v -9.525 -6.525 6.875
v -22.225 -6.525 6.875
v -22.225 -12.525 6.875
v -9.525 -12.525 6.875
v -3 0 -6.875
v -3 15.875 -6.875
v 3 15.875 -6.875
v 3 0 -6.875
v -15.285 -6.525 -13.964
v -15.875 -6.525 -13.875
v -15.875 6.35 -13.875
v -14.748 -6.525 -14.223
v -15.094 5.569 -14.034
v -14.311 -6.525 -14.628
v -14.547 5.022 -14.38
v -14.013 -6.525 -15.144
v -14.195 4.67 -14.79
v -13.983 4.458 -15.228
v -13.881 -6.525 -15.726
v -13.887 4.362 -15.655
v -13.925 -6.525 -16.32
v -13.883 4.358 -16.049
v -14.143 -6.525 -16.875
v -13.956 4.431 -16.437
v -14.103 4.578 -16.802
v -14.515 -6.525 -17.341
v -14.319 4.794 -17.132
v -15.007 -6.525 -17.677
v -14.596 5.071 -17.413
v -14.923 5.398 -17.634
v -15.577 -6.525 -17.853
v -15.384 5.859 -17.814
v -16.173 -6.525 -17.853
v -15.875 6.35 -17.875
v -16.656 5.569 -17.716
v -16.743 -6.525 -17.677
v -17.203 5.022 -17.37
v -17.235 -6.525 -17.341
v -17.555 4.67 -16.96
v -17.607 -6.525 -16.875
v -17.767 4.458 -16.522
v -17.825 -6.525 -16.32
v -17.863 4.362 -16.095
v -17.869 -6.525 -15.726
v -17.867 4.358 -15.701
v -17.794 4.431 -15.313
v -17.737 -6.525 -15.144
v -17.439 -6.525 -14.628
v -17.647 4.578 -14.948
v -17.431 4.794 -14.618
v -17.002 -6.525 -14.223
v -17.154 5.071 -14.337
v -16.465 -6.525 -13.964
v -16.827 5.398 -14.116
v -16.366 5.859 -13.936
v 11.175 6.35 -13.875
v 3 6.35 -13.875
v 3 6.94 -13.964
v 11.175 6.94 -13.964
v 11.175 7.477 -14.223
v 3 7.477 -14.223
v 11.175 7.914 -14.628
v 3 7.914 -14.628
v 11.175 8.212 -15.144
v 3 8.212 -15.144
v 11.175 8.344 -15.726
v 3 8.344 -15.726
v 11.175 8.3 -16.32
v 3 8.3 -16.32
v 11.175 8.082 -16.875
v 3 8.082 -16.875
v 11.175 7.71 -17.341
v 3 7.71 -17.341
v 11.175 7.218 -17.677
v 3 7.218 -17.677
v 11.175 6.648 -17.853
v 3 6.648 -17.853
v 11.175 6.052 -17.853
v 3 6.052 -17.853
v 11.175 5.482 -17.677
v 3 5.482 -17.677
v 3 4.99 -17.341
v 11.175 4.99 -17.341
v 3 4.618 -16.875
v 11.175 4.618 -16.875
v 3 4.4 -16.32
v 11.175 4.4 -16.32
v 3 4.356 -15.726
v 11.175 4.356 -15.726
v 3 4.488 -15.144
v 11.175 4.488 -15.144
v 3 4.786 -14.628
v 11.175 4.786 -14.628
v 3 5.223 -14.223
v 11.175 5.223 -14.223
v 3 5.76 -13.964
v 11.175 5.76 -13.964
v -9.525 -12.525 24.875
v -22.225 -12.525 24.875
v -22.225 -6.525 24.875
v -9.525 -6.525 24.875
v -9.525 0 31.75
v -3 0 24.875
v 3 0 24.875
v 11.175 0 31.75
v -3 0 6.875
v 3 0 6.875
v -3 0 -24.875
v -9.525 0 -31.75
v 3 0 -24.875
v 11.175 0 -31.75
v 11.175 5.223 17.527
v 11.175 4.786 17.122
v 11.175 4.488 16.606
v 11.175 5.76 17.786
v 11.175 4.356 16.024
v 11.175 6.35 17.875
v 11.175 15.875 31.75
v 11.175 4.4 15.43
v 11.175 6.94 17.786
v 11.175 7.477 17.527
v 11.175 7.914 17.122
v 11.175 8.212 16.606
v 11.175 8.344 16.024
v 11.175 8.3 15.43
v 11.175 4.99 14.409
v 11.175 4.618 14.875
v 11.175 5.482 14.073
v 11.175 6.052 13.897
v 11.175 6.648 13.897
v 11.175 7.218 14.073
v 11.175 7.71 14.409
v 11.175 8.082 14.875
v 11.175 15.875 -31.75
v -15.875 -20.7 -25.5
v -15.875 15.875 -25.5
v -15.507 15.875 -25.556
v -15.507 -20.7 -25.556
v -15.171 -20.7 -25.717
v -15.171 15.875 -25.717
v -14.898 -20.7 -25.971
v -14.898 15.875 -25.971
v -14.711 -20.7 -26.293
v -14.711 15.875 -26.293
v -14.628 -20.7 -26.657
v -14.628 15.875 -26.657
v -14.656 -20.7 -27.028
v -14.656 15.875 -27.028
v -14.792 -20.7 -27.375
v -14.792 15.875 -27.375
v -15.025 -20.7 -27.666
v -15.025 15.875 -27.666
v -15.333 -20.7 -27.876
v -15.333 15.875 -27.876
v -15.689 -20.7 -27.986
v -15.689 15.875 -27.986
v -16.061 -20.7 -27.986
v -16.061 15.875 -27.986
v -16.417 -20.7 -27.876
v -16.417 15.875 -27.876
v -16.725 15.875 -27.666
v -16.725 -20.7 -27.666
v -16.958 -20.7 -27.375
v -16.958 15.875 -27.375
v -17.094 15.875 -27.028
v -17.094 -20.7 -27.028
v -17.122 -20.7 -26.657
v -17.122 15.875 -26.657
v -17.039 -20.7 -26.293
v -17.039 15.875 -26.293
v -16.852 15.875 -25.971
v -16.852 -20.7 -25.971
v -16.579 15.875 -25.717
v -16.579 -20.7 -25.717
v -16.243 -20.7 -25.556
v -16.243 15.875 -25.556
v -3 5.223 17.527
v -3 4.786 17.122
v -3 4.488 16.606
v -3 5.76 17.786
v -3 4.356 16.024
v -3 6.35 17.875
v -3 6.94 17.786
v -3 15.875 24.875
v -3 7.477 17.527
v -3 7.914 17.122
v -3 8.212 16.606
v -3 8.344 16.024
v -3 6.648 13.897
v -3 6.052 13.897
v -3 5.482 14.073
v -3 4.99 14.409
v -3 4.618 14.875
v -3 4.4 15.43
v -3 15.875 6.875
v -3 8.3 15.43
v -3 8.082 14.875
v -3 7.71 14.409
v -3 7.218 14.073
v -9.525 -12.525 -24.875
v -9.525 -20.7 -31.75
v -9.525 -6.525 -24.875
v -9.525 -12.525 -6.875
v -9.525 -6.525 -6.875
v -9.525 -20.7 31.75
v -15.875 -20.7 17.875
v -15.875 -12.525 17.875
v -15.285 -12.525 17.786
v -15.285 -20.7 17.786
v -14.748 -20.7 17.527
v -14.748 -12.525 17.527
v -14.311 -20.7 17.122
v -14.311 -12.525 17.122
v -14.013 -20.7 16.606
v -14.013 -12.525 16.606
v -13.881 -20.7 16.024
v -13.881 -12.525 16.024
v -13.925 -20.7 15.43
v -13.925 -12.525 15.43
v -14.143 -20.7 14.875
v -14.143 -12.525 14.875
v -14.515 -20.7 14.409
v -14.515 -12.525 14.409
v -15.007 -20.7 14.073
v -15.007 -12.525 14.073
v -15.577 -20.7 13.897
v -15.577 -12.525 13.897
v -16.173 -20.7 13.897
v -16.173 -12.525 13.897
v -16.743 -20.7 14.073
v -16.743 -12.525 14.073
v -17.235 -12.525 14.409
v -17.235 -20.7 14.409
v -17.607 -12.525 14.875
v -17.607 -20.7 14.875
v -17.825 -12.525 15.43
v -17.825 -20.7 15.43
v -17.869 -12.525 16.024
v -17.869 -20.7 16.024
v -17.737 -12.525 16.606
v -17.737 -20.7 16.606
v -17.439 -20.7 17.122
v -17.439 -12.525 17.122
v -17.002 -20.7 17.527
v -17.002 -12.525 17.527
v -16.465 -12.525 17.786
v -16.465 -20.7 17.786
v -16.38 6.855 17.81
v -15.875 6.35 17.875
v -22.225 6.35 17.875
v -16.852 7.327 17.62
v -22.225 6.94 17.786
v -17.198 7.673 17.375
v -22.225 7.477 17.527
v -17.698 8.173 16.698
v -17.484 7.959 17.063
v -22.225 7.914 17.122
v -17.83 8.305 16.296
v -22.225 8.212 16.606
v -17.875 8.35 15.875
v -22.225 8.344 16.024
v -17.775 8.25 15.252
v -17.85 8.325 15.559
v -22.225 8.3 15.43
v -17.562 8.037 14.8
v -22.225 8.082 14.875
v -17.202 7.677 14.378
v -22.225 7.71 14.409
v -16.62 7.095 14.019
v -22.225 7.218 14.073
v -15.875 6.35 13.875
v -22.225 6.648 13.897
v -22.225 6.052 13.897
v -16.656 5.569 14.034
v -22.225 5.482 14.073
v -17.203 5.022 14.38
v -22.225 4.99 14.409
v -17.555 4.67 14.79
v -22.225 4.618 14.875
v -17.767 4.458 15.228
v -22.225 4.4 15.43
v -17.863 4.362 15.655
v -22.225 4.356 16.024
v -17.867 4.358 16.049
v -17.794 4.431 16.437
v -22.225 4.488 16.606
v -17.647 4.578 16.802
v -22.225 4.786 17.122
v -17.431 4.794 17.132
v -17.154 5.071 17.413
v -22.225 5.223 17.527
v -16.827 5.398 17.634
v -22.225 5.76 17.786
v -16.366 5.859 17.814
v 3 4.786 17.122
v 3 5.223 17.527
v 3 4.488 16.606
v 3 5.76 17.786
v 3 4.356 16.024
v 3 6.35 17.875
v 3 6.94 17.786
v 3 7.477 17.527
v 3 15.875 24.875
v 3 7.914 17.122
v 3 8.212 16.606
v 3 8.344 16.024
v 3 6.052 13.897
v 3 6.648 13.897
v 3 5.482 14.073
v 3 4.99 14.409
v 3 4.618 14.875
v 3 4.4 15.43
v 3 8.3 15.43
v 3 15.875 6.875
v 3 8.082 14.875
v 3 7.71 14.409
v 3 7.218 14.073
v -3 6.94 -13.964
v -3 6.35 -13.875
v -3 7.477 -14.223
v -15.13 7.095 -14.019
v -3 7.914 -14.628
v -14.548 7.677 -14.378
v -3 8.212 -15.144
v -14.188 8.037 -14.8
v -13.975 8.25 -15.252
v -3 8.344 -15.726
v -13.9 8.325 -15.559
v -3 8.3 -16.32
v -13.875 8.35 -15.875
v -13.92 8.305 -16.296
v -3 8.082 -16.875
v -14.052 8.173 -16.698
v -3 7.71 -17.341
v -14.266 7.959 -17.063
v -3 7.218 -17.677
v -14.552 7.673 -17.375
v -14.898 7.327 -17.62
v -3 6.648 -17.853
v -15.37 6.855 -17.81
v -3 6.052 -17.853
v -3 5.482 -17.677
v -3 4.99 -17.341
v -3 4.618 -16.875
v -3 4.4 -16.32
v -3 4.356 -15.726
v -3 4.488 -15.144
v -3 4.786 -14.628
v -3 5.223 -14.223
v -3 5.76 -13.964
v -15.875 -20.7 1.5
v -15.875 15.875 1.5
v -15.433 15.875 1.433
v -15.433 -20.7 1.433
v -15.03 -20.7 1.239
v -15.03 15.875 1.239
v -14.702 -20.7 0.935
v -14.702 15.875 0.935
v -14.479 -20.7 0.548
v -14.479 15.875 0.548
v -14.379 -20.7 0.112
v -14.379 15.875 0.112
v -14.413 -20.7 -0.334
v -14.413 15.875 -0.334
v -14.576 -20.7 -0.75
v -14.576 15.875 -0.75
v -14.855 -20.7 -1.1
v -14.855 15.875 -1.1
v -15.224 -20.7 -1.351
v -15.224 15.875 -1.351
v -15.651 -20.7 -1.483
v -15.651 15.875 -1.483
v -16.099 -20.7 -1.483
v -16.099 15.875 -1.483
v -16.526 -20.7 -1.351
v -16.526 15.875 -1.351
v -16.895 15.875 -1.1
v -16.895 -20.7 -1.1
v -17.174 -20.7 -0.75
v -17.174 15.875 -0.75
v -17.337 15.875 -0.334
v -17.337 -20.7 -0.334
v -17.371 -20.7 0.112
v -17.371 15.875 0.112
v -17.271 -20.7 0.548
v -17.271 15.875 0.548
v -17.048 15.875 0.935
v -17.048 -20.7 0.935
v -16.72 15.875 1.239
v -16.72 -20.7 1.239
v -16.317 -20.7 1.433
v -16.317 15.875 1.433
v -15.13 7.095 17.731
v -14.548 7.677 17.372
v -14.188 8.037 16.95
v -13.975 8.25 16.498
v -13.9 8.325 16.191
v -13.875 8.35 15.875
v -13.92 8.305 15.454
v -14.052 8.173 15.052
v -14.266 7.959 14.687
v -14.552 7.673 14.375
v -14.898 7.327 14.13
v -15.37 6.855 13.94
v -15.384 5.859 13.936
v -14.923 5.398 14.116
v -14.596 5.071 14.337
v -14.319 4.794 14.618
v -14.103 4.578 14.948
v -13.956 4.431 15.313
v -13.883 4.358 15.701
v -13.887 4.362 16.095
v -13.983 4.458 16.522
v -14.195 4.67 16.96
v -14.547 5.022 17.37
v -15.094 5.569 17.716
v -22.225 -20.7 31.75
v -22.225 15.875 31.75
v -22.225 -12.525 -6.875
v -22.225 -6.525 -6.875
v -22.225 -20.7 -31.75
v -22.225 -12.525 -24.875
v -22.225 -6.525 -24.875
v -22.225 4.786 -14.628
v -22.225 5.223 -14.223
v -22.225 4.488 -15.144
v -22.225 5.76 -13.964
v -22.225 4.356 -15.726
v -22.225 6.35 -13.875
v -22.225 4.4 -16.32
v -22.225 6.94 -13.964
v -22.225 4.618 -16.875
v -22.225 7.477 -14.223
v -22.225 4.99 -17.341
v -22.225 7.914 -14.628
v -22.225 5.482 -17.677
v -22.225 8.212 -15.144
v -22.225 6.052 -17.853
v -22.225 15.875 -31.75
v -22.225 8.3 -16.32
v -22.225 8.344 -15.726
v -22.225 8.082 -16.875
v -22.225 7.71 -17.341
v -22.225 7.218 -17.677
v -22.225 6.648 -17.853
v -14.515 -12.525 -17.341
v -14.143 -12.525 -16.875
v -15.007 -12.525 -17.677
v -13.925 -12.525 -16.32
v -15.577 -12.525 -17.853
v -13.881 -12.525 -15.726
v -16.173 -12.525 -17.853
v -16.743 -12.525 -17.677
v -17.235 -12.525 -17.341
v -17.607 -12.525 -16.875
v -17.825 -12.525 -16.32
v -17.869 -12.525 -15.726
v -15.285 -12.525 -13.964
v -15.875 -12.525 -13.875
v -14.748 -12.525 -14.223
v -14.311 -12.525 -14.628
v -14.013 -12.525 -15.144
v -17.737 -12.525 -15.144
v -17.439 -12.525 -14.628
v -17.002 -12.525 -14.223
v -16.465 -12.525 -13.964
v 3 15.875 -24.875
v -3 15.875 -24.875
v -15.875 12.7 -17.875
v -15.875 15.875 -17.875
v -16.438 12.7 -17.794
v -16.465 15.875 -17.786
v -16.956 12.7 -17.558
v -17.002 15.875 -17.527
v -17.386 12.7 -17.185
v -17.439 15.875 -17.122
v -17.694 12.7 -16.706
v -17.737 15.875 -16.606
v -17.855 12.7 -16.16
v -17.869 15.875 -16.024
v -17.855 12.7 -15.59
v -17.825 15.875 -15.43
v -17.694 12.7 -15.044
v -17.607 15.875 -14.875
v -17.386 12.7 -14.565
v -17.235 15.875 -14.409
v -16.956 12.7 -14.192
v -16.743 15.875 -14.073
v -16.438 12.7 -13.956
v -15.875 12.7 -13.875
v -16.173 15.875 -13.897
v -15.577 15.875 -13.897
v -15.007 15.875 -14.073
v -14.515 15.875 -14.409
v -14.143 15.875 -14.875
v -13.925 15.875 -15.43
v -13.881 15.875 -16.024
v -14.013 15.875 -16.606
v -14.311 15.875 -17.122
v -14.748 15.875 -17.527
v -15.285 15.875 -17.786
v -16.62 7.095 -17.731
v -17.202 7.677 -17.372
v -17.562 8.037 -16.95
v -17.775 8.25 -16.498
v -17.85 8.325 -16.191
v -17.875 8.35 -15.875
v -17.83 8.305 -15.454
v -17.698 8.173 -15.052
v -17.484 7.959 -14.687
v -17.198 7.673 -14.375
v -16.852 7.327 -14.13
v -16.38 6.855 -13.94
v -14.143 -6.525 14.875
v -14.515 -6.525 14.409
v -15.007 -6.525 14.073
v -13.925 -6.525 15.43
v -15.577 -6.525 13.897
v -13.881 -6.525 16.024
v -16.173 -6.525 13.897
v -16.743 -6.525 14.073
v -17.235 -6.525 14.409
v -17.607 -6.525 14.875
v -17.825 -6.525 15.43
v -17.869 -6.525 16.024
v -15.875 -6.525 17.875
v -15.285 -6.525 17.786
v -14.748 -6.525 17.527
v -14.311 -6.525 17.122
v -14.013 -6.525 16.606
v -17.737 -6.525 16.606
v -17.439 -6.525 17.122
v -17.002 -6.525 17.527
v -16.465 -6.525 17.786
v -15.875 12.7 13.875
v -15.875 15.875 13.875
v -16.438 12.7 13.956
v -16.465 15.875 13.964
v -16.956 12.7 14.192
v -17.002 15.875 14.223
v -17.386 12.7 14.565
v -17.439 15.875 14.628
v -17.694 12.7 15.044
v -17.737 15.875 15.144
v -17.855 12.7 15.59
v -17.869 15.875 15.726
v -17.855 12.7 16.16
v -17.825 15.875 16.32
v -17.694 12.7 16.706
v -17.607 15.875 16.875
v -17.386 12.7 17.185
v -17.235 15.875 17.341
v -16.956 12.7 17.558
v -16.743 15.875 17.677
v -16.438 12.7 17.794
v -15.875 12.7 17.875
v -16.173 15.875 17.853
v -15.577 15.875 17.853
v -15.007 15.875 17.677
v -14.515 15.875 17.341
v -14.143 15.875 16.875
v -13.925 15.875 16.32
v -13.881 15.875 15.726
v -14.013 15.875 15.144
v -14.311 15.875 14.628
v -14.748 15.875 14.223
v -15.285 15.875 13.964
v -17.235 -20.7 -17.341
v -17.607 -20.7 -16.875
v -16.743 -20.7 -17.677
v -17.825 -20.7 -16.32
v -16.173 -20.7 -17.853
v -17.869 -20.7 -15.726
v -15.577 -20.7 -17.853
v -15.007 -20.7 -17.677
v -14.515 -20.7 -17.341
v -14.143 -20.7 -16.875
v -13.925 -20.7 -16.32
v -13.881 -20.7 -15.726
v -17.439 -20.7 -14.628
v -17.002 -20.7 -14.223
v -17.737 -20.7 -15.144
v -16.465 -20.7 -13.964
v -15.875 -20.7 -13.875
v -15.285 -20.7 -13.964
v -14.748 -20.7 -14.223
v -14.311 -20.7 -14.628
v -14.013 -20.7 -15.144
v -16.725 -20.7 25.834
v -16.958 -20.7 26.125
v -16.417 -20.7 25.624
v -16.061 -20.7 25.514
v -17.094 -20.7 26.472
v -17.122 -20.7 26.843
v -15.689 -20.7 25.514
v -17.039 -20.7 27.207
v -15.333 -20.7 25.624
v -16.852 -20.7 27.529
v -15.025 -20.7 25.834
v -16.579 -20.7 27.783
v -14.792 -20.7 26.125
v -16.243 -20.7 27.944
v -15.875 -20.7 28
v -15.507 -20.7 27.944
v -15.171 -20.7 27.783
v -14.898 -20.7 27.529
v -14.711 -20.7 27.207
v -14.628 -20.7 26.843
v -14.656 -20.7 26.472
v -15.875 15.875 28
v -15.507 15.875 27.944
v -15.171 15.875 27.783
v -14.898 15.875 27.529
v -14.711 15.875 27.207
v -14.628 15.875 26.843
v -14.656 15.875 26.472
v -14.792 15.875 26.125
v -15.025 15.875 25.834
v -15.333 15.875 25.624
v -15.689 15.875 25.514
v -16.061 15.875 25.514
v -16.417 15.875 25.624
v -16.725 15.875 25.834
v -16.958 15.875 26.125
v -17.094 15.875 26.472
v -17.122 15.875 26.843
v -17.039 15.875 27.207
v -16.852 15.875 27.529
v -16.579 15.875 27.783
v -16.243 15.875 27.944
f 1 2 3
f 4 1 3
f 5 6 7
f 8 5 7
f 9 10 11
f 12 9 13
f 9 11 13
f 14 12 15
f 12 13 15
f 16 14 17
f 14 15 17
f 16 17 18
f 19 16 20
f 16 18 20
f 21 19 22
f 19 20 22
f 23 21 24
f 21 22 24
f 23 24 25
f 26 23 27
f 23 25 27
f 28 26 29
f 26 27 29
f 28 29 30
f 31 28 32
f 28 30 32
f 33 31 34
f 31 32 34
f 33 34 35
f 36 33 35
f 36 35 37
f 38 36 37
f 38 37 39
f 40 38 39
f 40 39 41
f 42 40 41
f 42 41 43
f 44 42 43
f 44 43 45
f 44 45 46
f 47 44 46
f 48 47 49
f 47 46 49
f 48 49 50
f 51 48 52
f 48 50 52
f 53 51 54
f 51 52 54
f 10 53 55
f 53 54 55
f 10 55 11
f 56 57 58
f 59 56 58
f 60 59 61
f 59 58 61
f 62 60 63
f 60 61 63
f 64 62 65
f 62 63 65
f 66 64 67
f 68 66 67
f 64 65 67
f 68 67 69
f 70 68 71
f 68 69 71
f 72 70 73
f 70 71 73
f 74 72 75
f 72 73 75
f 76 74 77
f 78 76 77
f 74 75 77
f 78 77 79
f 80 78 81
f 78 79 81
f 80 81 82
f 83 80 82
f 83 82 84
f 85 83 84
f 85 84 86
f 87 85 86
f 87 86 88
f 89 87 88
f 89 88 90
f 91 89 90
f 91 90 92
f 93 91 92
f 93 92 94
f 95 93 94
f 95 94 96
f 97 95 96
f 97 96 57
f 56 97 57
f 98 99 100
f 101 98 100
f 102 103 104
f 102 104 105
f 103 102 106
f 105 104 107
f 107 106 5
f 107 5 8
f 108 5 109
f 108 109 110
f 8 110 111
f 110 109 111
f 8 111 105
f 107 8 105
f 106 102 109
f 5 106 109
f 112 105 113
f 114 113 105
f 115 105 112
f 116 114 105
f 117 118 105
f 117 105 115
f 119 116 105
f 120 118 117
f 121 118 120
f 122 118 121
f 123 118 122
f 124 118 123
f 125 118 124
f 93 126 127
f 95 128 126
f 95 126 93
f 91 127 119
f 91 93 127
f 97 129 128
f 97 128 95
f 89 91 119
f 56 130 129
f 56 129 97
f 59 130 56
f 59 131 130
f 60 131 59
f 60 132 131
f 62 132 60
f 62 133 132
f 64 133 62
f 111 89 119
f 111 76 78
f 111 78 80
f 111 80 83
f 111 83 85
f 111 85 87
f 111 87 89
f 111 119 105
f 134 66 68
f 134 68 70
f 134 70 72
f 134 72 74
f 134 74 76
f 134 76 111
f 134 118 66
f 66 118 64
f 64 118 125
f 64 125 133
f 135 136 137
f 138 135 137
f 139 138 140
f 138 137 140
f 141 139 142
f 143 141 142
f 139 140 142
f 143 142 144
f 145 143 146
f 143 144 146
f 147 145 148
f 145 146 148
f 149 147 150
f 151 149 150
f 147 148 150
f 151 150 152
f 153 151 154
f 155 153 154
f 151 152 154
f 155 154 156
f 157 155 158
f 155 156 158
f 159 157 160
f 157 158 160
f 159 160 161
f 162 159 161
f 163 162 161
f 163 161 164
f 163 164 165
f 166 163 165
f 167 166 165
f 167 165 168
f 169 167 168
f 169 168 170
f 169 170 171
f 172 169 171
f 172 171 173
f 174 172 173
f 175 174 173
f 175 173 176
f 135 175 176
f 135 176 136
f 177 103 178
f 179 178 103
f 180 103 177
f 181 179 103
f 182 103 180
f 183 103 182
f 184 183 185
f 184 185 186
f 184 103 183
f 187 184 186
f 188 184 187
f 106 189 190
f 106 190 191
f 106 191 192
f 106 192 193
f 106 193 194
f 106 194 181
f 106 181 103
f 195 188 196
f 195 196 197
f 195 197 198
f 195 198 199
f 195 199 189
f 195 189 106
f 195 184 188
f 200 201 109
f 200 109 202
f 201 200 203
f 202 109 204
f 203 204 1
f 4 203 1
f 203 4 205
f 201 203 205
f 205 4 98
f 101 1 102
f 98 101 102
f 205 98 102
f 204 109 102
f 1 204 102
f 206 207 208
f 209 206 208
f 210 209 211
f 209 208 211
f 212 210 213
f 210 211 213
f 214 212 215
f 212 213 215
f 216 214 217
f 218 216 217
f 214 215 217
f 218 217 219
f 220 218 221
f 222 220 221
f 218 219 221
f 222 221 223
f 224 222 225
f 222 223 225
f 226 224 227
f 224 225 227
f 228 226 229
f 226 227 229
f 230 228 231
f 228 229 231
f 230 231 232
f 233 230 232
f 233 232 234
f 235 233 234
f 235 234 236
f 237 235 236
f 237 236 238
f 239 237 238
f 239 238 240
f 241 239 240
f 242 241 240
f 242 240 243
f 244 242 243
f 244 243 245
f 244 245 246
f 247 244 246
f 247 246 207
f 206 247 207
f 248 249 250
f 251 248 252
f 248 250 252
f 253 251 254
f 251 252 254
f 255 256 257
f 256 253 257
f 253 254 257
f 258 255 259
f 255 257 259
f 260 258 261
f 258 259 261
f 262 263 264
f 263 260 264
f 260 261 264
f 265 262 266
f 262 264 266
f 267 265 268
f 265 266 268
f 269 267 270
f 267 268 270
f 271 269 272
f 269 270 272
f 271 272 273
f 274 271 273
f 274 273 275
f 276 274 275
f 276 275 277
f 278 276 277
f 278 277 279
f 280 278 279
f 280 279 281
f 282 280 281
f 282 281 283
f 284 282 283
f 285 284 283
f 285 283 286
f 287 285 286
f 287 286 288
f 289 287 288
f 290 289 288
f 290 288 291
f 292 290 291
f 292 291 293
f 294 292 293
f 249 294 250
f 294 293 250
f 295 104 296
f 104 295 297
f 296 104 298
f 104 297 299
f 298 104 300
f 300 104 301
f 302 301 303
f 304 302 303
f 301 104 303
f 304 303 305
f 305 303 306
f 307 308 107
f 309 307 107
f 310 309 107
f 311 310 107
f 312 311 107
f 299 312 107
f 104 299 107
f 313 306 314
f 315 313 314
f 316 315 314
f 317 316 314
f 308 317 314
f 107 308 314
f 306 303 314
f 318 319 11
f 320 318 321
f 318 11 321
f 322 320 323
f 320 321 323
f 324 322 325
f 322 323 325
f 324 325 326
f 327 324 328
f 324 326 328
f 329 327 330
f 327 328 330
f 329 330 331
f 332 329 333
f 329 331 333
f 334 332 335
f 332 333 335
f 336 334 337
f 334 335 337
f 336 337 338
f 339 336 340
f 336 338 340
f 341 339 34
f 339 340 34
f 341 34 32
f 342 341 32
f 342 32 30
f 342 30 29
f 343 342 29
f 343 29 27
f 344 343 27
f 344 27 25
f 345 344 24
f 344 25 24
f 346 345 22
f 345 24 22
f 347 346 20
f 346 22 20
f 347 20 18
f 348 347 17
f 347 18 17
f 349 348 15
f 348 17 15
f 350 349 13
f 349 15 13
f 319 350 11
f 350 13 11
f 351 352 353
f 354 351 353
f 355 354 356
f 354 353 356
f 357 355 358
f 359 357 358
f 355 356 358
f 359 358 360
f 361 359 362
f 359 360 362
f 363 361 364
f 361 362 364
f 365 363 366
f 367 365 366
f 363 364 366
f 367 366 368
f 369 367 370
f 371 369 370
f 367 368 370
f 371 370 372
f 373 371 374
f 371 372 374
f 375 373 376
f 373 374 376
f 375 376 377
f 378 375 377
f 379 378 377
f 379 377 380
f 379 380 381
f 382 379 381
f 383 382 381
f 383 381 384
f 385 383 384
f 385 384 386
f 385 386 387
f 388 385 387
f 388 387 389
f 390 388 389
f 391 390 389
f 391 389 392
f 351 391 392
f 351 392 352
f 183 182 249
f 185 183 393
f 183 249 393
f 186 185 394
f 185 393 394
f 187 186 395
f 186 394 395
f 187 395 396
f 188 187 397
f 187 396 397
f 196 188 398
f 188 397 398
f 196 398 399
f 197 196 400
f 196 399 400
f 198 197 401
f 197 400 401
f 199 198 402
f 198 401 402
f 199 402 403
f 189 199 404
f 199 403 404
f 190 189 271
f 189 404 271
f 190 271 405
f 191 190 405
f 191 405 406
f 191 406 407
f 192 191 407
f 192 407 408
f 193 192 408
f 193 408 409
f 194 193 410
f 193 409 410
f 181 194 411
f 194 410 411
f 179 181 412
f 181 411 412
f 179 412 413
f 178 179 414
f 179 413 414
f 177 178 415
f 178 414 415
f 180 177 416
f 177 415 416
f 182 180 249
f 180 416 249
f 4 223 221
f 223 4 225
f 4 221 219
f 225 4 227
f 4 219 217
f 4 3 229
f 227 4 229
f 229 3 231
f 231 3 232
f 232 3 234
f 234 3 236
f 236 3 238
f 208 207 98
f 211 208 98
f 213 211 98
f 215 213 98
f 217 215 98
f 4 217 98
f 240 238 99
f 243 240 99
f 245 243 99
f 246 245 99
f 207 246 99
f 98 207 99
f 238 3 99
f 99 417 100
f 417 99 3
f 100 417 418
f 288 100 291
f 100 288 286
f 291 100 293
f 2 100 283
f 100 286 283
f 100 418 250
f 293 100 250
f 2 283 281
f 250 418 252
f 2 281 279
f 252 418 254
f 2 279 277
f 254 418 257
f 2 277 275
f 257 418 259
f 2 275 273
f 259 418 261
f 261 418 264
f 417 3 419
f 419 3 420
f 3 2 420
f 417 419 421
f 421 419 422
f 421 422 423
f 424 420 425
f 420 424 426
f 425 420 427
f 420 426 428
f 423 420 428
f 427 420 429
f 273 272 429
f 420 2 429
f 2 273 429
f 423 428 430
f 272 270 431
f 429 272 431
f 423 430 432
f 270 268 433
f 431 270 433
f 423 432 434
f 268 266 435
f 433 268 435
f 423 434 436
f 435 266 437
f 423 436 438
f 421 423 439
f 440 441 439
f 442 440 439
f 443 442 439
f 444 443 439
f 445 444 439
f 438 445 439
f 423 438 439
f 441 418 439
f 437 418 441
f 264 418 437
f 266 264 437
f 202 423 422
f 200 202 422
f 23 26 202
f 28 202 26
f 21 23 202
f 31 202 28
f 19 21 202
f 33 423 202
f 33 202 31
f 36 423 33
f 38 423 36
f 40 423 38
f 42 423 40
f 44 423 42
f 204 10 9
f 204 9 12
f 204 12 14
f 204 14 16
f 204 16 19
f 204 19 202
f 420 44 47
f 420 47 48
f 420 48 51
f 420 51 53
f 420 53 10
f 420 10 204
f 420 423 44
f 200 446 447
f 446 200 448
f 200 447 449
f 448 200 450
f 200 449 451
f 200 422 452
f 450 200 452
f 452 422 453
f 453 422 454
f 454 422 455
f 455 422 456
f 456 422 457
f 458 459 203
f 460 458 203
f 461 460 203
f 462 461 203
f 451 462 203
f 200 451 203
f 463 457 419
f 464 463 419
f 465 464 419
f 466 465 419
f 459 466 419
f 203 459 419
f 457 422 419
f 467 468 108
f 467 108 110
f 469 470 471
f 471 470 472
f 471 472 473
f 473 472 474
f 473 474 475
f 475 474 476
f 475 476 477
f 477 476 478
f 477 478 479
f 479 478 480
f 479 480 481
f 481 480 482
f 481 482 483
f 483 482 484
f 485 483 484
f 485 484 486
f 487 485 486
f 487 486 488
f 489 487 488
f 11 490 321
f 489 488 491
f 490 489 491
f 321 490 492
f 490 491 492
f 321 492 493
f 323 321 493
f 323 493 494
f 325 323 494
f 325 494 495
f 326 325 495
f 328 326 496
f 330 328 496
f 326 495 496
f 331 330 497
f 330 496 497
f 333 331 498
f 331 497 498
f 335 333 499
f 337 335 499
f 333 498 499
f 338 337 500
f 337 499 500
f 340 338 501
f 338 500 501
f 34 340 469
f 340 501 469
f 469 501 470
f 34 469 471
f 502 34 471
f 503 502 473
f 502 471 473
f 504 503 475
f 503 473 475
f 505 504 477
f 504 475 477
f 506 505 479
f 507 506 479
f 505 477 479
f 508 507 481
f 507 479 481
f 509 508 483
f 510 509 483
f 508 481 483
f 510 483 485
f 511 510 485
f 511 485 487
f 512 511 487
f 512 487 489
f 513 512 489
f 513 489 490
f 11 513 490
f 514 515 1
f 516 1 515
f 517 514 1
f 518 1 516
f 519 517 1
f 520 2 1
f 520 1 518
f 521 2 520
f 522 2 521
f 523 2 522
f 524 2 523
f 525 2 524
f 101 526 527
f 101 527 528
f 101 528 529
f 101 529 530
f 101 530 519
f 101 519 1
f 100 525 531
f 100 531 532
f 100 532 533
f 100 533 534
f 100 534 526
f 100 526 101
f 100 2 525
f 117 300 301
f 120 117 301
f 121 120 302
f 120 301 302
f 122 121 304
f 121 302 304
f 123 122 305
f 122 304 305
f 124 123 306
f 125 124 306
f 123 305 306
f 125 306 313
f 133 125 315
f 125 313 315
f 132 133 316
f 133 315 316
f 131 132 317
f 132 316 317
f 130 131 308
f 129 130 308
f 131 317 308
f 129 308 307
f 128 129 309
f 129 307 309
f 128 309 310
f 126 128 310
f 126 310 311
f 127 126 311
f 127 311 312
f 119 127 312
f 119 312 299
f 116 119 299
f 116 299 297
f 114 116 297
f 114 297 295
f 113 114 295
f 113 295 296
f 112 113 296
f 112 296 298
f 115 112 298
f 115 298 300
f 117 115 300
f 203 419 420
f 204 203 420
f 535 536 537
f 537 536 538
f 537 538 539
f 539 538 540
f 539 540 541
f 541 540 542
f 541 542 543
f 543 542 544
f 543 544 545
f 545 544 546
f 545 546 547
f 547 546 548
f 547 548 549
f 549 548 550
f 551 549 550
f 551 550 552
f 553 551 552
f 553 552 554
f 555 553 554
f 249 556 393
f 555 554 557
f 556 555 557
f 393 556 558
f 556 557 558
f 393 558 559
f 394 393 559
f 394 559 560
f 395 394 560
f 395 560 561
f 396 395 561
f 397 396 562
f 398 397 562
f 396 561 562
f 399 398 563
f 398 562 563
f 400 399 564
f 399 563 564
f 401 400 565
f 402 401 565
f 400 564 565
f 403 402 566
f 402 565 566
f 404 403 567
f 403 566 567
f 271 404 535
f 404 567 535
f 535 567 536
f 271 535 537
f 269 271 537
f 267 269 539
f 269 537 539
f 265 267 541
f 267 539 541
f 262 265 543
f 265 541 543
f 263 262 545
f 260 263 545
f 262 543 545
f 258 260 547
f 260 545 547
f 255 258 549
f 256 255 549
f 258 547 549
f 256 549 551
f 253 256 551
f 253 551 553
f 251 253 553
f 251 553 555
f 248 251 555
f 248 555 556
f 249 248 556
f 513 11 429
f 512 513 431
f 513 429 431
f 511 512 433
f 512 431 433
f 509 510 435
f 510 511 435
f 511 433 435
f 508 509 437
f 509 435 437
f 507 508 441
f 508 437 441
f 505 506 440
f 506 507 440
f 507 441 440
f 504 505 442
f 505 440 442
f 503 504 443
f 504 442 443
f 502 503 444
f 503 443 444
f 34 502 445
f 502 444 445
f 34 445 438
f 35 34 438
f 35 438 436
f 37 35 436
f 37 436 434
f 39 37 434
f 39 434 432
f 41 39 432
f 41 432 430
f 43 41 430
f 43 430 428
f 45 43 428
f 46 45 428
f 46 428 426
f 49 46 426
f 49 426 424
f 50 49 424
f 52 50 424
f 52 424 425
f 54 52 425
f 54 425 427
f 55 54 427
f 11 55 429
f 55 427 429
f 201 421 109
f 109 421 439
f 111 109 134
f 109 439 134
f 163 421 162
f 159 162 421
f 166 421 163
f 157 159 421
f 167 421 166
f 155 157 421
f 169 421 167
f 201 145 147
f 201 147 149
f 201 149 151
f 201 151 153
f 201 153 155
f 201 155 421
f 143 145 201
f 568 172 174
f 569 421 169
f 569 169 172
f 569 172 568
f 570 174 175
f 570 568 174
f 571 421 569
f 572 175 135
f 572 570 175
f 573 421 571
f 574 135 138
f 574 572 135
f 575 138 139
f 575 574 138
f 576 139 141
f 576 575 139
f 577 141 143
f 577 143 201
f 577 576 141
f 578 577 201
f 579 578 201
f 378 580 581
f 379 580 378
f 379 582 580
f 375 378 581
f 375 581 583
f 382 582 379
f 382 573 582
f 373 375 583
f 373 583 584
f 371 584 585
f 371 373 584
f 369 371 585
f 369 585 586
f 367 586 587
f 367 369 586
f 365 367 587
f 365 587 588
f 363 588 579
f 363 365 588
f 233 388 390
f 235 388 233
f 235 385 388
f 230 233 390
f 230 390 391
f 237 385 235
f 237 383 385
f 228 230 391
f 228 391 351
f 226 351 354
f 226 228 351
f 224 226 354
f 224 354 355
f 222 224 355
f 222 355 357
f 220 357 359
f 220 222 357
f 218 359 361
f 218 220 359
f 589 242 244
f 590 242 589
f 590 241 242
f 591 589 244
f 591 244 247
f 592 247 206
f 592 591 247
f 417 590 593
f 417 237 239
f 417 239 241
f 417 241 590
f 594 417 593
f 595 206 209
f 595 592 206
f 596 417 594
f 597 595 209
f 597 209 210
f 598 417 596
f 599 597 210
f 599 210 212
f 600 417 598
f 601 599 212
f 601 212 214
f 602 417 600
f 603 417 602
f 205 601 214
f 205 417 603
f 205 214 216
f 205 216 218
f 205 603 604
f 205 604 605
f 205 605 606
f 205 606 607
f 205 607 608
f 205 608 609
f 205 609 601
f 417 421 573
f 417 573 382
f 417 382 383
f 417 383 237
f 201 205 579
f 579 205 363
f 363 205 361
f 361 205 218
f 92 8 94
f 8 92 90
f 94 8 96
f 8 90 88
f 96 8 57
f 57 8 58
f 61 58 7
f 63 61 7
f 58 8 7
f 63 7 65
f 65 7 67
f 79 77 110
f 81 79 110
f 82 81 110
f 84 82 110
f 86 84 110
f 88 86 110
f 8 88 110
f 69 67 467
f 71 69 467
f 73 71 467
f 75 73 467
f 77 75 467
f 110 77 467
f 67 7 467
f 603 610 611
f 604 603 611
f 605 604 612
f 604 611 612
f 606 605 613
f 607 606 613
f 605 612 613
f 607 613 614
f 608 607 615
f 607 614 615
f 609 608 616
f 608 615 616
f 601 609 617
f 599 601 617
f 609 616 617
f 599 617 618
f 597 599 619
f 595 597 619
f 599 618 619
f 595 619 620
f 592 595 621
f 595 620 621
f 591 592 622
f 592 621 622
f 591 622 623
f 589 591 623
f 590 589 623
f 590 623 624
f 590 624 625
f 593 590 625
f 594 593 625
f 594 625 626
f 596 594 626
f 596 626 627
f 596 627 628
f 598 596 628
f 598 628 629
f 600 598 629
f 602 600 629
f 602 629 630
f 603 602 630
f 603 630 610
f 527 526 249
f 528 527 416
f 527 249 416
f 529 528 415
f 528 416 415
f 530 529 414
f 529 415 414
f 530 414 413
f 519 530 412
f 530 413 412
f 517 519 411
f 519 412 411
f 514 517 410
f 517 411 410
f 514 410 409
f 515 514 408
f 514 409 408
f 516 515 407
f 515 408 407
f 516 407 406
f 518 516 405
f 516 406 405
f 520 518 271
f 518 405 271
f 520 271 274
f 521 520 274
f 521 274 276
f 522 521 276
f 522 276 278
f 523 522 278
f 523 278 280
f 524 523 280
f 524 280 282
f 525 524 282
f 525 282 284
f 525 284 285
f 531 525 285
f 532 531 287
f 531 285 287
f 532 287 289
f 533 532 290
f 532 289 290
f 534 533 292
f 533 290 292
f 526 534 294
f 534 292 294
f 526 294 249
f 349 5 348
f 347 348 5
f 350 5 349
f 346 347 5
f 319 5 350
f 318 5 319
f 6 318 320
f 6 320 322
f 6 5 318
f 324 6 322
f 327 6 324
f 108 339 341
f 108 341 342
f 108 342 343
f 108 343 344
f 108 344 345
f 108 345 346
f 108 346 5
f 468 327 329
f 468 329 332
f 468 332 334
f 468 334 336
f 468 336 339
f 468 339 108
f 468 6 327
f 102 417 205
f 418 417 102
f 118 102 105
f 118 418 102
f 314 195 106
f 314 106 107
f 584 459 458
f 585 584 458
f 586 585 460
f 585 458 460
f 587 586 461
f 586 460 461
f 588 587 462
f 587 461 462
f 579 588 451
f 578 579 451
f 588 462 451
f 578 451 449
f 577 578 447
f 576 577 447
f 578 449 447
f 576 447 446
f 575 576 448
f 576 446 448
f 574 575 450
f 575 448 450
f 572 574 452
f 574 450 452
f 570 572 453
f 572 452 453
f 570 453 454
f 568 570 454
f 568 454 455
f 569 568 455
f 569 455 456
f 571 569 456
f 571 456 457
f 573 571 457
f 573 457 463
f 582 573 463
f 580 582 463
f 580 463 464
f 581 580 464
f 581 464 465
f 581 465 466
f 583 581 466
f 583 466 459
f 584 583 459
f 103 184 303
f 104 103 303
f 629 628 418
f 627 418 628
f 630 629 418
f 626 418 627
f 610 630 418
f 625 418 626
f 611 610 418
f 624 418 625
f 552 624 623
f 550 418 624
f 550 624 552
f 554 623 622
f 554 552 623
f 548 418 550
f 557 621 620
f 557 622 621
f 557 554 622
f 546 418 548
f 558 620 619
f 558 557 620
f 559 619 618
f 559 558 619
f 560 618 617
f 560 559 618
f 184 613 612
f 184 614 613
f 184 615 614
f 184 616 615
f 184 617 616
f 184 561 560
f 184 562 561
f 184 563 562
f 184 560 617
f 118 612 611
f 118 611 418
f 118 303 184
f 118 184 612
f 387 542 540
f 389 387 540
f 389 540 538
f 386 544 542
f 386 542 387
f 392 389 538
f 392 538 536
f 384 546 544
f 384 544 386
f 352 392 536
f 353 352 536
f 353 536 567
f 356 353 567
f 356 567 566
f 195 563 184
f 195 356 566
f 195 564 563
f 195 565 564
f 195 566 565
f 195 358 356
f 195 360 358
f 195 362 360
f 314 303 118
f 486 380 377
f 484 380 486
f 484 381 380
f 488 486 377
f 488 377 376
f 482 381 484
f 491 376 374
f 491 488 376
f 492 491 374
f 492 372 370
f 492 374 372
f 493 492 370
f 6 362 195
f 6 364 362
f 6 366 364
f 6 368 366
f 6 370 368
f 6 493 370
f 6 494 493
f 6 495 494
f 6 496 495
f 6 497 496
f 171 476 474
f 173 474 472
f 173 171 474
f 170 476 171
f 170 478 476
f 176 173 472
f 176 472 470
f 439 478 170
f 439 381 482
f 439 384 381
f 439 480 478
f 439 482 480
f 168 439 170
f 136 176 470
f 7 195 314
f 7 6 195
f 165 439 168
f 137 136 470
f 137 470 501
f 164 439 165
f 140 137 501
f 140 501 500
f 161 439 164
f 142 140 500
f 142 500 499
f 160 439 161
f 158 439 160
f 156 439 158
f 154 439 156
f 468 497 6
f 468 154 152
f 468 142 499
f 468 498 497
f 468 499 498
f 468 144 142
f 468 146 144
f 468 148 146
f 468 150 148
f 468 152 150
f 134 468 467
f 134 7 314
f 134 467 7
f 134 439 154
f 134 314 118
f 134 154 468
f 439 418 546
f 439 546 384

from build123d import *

# Parameters (mm, degrees)
BOSS_EXTRUDE1_DEPTH = 12.7
SKETCH2_W           = 12.7
SKETCH2_H           = 63.5
BOSS_EXTRUDE2_DEPTH = 31.75
SKETCH3_W           = 18
SKETCH3_H           = 3
CUT_EXTRUDE1_DEPTH  = 19.05
SKETCH4_R           = 2
CUT_EXTRUDE2_DEPTH  = 59.973007597
SKETCH5_R           = 2
CUT_EXTRUDE3_DEPTH  = 64.181702256
SKETCH6_W           = 63.5
SKETCH6_H           = 12.7
CUT_EXTRUDE4_DEPTH  = 11.05
SKETCH7_W           = 12.7
SKETCH7_H           = 63.5
CUT_EXTRUDE5_DEPTH  = 11.05
BOSS_EXTRUDE3_START = 3.175
SKETCH8_W           = 33.4
SKETCH8_H           = 63.5
SKETCH8_R           = 2
SKETCH8_W_2         = 6
SKETCH8_H_2         = 18
BOSS_EXTRUDE3_DEPTH = 3.175
SKETCH9_R           = 1.25
SKETCH9_R_2         = 1.5
CUT_EXTRUDE6_DEPTH  = 54.289246101


with BuildPart() as part:
    # Sketch1 → Boss-Extrude1 (new body)
    with BuildSketch(Plane(origin=(0, 0, 0), x_dir=(1, 0, 0), z_dir=(0, 1, 0))):
        Polygon((-22.225, 31.75), (-22.225, -31.75), (0, -31.75), (0, -24.875), (-3, -24.875), (-3, -6.875), (0, -6.875), (0, 0), (0, 6.875), (-3, 6.875), (-3, 24.875), (0, 24.875), (0, 31.75), align=None)
        Polygon((0, -24.875), (0, -31.75), (22.225, -31.75), (22.225, 31.75), (0, 31.75), (0, 24.875), (3, 24.875), (3, 6.875), (0, 6.875), (0, 0), (0, -6.875), (3, -6.875), (3, -24.875), align=None)
    extrude(amount=BOSS_EXTRUDE1_DEPTH)

    # Sketch2 → Boss-Extrude2 (add)
    with BuildSketch(Plane.XZ):
        with Locations((-15.875, 0)):
            Rectangle(SKETCH2_W, SKETCH2_H)
    extrude(amount=BOSS_EXTRUDE2_DEPTH)

    # Sketch3 → Cut-Extrude1 (cut)
    with BuildSketch(Plane.ZY.offset(22.225)):
        with Locations((-15.875, -8.025)):
            Rectangle(SKETCH3_W, SKETCH3_H)
        with Locations((-15.875, -11.025)):
            Rectangle(SKETCH3_W, SKETCH3_H)
        with Locations((15.875, -8.025)):
            Rectangle(SKETCH3_W, SKETCH3_H)
        with Locations((15.875, -11.025)):
            Rectangle(SKETCH3_W, SKETCH3_H)
    extrude(amount=-CUT_EXTRUDE1_DEPTH, mode=Mode.SUBTRACT)

    # Sketch4 → Cut-Extrude2 (cut, through all)
    with BuildSketch(Plane(origin=(0, 12.7, 0), x_dir=(1, 0, 0), z_dir=(0, 1, 0))):
        with Locations(Location((-15.875, 15.875, 0), (0, 0, 270))):
            Circle(SKETCH4_R)
        with Locations(Location((-15.875, -15.875, 0), (0, 0, 270))):
            Circle(SKETCH4_R)
    extrude(amount=-CUT_EXTRUDE2_DEPTH, mode=Mode.SUBTRACT)

    # Sketch5 → Cut-Extrude3 (cut, through all)
    with BuildSketch(Plane.ZY.offset(22.225)):
        with Locations((-15.875, 6.35)):
            Circle(SKETCH5_R)
        with Locations((15.875, 6.35)):
            Circle(SKETCH5_R)
    extrude(amount=-CUT_EXTRUDE3_DEPTH, mode=Mode.SUBTRACT)

    # Sketch6 → Cut-Extrude4 (cut)
    with BuildSketch(Plane(origin=(22.225, 0, 0), x_dir=(0, 0, -1), z_dir=(1, 0, 0))):
        with Locations((0, 6.35)):
            Rectangle(SKETCH6_W, SKETCH6_H)
    extrude(amount=-CUT_EXTRUDE4_DEPTH, mode=Mode.SUBTRACT)

    # Sketch7 → Cut-Extrude5 (cut)
    with BuildSketch(Plane.XZ.offset(31.75)):
        with Locations((-15.875, 0)):
            Rectangle(SKETCH7_W, SKETCH7_H)
    extrude(amount=-CUT_EXTRUDE5_DEPTH, mode=Mode.SUBTRACT)

    # Sketch8 → Boss-Extrude3 (add)
    with BuildSketch(Plane(origin=(0, 12.7, 0), x_dir=(1, 0, 0), z_dir=(0, 1, 0)).offset(BOSS_EXTRUDE3_START)):
        with Locations((-5.525, 0)):
            Rectangle(SKETCH8_W, SKETCH8_H)
        with Locations(Location((-15.875, 15.875, 0), (0, 0, 90))):
            Circle(SKETCH8_R, mode=Mode.SUBTRACT)
        with Locations(Location((-15.875, -15.875, 0), (0, 0, 90))):
            Circle(SKETCH8_R, mode=Mode.SUBTRACT)
        with Locations((0, -15.875)):
            Rectangle(SKETCH8_W_2, SKETCH8_H_2, mode=Mode.SUBTRACT)
        with Locations((0, 15.875)):
            Rectangle(SKETCH8_W_2, SKETCH8_H_2, mode=Mode.SUBTRACT)
    extrude(amount=-BOSS_EXTRUDE3_DEPTH)

    # Sketch9 → Cut-Extrude6 (cut, through all)
    with BuildSketch(Plane(origin=(0, 15.875, 0), x_dir=(1, 0, 0), z_dir=(0, 1, 0))):
        with Locations(Location((-15.875, 26.75, 0), (0, 0, 270))):
            Circle(SKETCH9_R)
        with Locations(Location((-15.875, -26.75, 0), (0, 0, 270))):
            Circle(SKETCH9_R)
        with Locations(Location((-15.875, 0, 0), (0, 0, 270))):
            Circle(SKETCH9_R_2)
    extrude(amount=-CUT_EXTRUDE6_DEPTH, mode=Mode.SUBTRACT)


solid = part.part
